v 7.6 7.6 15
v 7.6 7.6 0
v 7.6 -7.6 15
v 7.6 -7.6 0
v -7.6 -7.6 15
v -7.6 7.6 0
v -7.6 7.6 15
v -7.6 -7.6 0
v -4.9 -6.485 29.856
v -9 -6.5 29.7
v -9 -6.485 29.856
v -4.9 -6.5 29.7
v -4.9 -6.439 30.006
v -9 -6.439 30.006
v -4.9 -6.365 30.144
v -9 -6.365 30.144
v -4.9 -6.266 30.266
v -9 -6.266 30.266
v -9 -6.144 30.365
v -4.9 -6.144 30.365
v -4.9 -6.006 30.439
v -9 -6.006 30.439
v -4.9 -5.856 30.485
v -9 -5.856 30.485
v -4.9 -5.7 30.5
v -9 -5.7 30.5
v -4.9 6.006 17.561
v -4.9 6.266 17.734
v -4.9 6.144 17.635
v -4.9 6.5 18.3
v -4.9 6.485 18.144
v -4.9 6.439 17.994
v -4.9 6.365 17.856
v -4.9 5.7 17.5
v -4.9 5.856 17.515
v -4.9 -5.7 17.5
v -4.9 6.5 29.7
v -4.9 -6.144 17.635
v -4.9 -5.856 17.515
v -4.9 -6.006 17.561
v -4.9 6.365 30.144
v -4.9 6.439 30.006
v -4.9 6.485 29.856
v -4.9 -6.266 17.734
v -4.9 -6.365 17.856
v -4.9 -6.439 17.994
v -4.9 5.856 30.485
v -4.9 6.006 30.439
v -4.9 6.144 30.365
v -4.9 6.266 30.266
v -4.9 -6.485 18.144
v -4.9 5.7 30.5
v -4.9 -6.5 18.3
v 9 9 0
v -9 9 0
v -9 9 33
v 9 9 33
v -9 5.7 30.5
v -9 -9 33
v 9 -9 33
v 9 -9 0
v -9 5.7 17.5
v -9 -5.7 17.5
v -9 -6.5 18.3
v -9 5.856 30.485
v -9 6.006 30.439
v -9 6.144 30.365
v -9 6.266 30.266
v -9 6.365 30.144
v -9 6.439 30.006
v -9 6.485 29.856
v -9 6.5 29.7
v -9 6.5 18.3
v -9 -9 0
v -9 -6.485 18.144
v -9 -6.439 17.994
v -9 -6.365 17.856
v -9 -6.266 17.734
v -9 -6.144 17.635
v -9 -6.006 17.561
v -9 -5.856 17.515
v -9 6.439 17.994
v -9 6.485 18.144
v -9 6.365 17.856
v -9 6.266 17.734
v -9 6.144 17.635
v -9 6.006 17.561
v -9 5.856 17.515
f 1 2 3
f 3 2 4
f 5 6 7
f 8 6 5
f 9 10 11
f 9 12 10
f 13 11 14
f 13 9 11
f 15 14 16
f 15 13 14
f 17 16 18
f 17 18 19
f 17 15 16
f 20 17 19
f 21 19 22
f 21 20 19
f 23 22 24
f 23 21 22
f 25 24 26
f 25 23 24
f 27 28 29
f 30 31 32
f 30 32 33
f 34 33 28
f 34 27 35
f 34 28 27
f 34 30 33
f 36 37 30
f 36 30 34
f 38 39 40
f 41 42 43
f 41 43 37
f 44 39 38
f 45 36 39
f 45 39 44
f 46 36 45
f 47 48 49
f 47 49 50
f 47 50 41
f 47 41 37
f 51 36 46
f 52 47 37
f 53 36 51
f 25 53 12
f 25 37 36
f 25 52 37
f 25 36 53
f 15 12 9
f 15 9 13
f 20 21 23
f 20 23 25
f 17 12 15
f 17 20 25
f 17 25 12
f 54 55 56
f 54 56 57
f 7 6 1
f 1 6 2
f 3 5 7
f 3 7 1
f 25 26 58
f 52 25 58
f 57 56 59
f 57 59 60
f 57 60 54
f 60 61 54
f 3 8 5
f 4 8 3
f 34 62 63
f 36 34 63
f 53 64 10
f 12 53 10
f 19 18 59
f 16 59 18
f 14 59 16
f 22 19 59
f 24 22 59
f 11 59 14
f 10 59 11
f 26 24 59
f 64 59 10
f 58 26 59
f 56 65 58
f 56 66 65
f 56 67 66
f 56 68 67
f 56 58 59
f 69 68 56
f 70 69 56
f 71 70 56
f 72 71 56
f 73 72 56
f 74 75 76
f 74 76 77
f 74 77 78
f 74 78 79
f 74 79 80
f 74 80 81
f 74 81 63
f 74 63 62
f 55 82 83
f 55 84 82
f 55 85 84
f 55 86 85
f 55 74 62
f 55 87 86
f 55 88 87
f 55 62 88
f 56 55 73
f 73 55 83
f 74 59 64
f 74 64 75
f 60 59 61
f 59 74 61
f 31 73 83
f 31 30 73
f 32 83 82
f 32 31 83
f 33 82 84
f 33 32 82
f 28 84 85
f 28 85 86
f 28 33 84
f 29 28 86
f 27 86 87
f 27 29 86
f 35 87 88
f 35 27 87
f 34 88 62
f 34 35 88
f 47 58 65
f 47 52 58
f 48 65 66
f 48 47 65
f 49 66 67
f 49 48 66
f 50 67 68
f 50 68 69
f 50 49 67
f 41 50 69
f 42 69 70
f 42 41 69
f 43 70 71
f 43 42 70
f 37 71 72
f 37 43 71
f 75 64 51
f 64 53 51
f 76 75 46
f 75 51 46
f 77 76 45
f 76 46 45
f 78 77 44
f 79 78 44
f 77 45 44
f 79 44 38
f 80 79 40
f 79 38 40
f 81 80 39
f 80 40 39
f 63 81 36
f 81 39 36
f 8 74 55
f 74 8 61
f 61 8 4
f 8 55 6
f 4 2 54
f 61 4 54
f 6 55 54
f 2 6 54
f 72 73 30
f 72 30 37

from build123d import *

# Parameters (mm, degrees)
F0_W      = 18
F0_H      = 18
F1_DEPTH  = 25
F1_FACE_W = 18
F1_FACE_H = 18
F2_DEPTH  = 8
F3_W      = 6.5
F3_H      = 13
F4_DEPTH  = 4.1
F5_W      = 15.2
F5_H      = 15.2
F6_DEPTH  = 15
F7_R      = 0.8


with BuildPart() as f1:
    # F0 (on Top) → F1 (new body)
    with BuildSketch(Plane.XY):
        Rectangle(F0_W, F0_H)
    extrude(amount=F1_DEPTH)

    # F1_face (on face) → F2 (join)
    with BuildSketch(Plane.XY.offset(25)):
        Rectangle(F1_FACE_W, F1_FACE_H)
    extrude(amount=F2_DEPTH)

    # F3 (on face) → F4 (cut)
    with BuildSketch(Plane(origin=(-9, 0, 0), x_dir=(0, -1, 0), z_dir=(-1, 0, 0))):
        with Locations((3.25, 24)):
            Rectangle(F3_W, F3_H)
        with Locations((-3.25, 24)):
            Rectangle(F3_W, F3_H)
    extrude(amount=-F4_DEPTH, mode=Mode.SUBTRACT)

    # F5 (on face) → F6 (cut)
    with BuildSketch(Plane(origin=(0, 0, 0), x_dir=(1, 0, 0), z_dir=(0, 0, -1))):
        Rectangle(F5_W, F5_H)
    extrude(amount=-F6_DEPTH, mode=Mode.SUBTRACT)

    # F7
    f7_edges = [f1.edges().sort_by_distance(p)[0] for p in [
        (-6.95, 6.5, 30.5),
        (-6.95, -6.5, 30.5),
        (-6.95, -6.5, 17.5),
        (-6.95, 6.5, 17.5),
    ]]
    fillet(f7_edges, radius=F7_R)


solid = f1.part
